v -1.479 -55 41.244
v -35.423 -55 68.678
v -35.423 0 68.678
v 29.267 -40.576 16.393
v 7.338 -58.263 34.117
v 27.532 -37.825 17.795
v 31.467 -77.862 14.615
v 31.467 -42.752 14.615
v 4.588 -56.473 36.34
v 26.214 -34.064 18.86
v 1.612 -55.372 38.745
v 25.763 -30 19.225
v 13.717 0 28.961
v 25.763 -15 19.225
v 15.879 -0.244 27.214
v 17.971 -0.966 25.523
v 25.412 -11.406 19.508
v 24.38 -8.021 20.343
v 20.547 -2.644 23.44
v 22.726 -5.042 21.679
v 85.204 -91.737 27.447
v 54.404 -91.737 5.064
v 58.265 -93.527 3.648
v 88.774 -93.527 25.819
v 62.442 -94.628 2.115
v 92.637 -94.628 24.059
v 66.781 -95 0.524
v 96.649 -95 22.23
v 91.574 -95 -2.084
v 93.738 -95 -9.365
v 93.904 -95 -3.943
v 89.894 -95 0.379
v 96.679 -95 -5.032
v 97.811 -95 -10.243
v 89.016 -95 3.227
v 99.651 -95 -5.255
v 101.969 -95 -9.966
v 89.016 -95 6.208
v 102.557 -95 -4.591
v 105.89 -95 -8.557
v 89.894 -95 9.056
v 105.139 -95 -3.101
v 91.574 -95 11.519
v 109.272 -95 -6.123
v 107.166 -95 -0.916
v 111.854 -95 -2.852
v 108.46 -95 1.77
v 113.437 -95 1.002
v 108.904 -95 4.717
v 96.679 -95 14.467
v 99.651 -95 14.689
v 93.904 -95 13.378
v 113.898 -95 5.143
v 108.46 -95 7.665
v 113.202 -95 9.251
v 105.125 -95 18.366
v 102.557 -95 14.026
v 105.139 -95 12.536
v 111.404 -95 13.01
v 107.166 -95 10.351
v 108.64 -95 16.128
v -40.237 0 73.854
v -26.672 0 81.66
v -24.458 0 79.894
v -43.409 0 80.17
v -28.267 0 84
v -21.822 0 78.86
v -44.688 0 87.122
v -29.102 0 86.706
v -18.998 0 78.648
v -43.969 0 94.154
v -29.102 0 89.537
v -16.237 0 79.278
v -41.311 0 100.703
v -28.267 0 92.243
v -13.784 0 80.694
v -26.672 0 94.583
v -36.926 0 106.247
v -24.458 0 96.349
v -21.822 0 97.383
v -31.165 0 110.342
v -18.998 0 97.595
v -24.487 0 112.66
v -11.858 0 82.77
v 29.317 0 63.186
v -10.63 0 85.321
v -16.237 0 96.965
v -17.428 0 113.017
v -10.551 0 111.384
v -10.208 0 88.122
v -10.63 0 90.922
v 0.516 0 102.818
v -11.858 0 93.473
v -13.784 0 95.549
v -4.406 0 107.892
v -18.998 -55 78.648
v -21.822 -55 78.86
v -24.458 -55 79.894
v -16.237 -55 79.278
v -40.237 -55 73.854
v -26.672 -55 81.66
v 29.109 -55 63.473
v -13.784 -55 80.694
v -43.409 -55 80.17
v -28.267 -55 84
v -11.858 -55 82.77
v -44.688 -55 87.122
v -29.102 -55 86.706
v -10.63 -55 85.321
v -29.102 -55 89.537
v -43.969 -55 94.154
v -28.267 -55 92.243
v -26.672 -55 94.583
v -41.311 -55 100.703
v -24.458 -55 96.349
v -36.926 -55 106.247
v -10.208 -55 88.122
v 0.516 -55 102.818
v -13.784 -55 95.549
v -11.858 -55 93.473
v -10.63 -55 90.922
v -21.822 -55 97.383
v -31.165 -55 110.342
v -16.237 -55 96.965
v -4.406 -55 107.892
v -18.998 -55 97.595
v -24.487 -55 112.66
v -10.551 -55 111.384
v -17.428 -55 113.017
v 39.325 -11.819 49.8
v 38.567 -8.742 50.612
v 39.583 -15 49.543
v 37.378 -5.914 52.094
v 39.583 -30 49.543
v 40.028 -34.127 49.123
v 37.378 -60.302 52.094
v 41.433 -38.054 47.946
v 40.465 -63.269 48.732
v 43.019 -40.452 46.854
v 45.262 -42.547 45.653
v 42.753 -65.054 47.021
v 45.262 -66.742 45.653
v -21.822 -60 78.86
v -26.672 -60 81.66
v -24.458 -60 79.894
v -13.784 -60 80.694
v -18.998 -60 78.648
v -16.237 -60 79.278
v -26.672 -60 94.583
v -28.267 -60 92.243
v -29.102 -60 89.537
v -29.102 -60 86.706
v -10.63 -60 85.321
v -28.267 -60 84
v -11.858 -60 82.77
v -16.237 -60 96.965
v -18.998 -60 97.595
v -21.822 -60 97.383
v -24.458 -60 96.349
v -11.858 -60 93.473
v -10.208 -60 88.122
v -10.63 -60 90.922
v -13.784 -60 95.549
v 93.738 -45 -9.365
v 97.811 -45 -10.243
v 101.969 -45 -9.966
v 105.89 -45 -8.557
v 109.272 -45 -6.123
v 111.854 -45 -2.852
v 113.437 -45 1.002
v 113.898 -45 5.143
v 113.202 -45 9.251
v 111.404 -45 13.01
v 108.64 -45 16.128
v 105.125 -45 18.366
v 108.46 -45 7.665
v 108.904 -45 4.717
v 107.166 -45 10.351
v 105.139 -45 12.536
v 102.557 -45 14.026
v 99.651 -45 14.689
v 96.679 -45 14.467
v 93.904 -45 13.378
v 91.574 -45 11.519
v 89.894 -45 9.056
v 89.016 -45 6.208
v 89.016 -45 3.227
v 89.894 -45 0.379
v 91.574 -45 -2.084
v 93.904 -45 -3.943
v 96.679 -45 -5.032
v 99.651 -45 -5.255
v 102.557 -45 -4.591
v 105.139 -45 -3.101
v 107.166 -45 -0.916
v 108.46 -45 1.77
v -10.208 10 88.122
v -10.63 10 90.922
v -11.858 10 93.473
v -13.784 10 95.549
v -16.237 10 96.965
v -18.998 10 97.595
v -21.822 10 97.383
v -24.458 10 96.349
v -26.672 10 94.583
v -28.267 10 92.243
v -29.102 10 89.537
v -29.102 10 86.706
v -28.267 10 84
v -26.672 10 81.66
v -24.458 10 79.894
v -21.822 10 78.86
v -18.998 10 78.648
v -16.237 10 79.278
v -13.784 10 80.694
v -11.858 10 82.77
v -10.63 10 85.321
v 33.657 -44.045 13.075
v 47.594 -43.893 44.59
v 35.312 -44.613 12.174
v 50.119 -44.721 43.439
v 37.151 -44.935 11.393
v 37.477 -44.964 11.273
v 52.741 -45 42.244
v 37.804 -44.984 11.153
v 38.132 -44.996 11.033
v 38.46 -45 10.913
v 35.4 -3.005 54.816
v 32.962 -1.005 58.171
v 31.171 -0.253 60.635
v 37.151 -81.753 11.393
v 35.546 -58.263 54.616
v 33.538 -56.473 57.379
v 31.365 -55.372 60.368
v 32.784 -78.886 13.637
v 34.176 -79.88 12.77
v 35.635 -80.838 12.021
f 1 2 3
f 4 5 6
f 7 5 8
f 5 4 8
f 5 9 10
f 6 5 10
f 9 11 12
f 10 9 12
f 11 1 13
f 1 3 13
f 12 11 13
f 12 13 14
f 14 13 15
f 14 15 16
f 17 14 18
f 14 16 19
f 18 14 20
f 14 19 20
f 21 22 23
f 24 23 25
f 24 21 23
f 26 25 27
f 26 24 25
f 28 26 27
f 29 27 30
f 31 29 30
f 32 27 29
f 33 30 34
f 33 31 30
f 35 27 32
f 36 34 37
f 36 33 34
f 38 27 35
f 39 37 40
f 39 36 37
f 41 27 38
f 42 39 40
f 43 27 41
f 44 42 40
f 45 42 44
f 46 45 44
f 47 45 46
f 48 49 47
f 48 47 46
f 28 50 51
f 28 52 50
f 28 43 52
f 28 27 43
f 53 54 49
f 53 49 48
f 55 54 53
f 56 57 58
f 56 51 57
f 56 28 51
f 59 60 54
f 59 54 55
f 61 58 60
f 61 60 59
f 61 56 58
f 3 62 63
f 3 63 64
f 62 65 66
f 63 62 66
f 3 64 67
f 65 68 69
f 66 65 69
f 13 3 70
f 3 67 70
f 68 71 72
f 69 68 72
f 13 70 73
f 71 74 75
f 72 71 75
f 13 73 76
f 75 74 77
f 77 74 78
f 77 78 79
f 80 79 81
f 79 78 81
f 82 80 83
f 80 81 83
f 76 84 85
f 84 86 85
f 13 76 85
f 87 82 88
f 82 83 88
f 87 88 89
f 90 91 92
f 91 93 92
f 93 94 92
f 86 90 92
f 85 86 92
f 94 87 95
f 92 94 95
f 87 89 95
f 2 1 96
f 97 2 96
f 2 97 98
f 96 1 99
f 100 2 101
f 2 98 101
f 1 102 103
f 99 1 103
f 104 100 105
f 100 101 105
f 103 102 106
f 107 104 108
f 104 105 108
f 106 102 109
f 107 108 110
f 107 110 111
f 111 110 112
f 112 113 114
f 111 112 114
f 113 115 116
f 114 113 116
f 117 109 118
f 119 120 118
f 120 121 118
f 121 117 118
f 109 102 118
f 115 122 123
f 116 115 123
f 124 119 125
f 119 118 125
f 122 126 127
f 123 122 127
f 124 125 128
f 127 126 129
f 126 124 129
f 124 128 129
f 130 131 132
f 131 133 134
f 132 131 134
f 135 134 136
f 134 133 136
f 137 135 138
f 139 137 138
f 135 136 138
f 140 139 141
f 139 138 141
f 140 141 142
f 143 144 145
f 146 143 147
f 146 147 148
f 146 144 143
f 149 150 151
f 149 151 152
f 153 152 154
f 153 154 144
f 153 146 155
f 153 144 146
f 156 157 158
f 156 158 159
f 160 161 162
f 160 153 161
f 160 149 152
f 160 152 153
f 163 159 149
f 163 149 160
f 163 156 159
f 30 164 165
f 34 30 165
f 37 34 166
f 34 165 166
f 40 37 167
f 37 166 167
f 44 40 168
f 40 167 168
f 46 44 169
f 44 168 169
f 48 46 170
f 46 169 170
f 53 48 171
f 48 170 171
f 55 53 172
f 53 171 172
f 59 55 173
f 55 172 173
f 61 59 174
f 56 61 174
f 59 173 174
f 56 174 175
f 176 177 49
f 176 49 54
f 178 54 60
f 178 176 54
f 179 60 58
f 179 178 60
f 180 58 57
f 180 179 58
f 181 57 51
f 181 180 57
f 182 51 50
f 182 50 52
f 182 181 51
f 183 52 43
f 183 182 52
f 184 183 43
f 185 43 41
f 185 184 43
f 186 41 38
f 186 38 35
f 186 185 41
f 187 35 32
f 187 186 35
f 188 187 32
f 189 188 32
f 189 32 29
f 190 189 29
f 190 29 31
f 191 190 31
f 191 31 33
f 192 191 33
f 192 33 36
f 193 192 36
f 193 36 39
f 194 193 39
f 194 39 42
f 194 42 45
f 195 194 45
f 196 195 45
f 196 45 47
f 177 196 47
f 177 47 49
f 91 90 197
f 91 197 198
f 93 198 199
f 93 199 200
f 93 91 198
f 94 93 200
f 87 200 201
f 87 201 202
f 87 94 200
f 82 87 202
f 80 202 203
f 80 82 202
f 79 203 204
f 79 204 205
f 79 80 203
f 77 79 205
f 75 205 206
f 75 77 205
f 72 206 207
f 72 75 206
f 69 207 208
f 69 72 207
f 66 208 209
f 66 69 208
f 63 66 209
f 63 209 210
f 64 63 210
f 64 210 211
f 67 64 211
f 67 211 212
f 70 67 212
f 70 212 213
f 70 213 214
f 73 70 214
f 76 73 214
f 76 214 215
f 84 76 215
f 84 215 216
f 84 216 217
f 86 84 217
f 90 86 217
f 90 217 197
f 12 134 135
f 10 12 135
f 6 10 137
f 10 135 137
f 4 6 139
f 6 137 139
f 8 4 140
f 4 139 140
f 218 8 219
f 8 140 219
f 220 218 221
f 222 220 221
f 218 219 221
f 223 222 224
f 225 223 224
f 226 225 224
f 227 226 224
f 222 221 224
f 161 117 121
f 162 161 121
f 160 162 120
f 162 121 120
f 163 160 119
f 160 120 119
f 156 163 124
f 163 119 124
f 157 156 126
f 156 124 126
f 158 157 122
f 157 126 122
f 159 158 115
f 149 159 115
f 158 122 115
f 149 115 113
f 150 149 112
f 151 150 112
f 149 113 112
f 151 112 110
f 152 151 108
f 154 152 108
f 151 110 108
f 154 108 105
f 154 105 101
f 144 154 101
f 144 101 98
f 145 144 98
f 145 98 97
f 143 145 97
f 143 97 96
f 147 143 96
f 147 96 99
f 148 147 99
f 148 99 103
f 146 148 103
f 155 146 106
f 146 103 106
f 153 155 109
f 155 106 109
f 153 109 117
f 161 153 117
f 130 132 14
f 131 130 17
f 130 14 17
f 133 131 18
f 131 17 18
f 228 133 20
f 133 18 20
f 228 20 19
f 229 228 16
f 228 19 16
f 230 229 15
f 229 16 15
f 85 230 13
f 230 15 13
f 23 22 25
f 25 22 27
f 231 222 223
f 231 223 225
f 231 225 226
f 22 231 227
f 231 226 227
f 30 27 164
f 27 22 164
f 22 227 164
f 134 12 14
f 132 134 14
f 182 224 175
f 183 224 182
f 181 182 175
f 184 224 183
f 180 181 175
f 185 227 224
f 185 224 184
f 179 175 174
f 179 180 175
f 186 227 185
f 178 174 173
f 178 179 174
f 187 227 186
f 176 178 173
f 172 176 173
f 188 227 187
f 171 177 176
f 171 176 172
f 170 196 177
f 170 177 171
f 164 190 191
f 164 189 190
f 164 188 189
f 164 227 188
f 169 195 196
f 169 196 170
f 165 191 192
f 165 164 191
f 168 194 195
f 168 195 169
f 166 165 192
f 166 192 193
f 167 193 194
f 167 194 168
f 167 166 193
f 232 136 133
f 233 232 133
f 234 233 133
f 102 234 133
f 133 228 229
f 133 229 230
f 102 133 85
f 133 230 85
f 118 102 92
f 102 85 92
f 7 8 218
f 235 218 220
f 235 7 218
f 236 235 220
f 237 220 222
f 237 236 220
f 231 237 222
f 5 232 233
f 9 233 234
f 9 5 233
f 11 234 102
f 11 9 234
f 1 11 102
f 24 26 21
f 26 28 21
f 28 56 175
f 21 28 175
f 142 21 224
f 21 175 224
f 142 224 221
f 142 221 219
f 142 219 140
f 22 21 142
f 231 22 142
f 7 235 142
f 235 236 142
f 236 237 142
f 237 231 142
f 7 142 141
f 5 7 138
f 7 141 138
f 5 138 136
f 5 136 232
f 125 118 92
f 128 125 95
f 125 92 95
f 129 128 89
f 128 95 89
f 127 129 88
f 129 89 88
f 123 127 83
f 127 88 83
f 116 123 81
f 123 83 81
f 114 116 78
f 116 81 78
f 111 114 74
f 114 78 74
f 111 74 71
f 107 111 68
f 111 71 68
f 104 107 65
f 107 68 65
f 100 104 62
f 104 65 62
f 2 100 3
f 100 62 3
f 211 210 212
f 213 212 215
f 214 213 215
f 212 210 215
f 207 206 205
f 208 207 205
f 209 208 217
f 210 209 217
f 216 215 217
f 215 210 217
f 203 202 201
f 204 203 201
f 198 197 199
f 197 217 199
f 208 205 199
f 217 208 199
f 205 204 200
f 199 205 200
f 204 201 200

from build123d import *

# Parameters (mm, degrees)
F0_R          = 10
F0_R_2        = 9.5
F1_DEPTH      = 95
F3_DEPTH      = 103.0741500701
F3_DEPTH_BACK = 97.783322066
F4_W          = 111.3981074931
F4_H          = 45
F5_DEPTH      = 88.2146892838
F5_DEPTH_BACK = 25
F6_R          = 15
F7_R          = 20
F8_R          = 9.5
F9_DEPTH      = 5
F9_DEPTH_BACK = 65
F10_R         = 20


with BuildPart() as f1:
    # F0 (on Front) → F1 (new body)
    with BuildSketch(Plane.XZ):
        with BuildLine():
            Line((40.472202318, 47.836435473), (0.5161550447, 102.8184539019))
            ThreePointArc((0.5161550447, 102.8184539019), (-36.9259098509, 106.247026954), (-35.422653502, 68.6783756984))
            Line((-35.422653502, 68.6783756984), (34.0419716339, 12.5334943419))
            Line((34.0419716339, 12.5334943419), (93.7381570012, -9.3650366096))
            ThreePointArc((93.7381570012, -9.3650366096), (112.7797489078, -0.9804332321), (105.1254790408, 18.3662964382))
            Line((105.1254790408, 18.3662964382), (40.472202318, 47.836435473))
        make_face()
        with Locations((98.9040414947, 4.7173508797)):
            Circle(F0_R, mode=Mode.SUBTRACT)
        with Locations((-19.7076478051, 88.121590349)):
            Circle(F0_R_2, mode=Mode.SUBTRACT)
    extrude(amount=F1_DEPTH)

    # F2 (on face) → F3 (cut, two sides)
    with BuildSketch(Plane(origin=(49.2343596113, 0, 35.7791593745), x_dir=(0, 1, 0), z_dir=(0.808952114, 0, 0.5878745421))) as f3_sk:
        Polygon((-55, 28.273306787), (-55, 107.9234746602), (-95, 107.9234746602), (-95, -12.0765253398), (-95, -32.8742563725), align=None)
    extrude(amount=-F3_DEPTH, mode=Mode.SUBTRACT)
    extrude(f3_sk.sketch, amount=F3_DEPTH_BACK, mode=Mode.SUBTRACT)

    # F4 (on face) → F5 (cut, two sides)
    with BuildSketch(Plane(origin=(25.0160459603, 0, 54.8816325595), x_dir=(0.9099297039, 0, -0.4147625031), z_dir=(0.4147625031, 0, 0.9099297039))) as f5_sk:
        with Locations((71.1682909773, -22.5)):
            Rectangle(F4_W, F4_H)
    extrude(amount=-F5_DEPTH, mode=Mode.SUBTRACT)
    extrude(f5_sk.sketch, amount=F5_DEPTH_BACK, mode=Mode.SUBTRACT)

    # F6
    f6_edges = [f1.edges().sort_by_distance(p)[0] for p in [
        (32.605588, -45, 34.23539),
        (32.605588, 0, 34.23539),
    ]]
    fillet(f6_edges, radius=F6_R)

    # F7
    f7_edges = [f1.edges().sort_by_distance(p)[0] for p in [
        (40.472202, -50.159062, 47.836435),
        (34.041972, -62.100604, 12.533494),
    ]]
    fillet(f7_edges, radius=F7_R)

    # F8 (on face) → F9 (join, two sides)
    with BuildSketch(Plane.XZ.offset(55)) as f9_sk:
        with Locations((-19.7076478051, 88.121590349)):
            Circle(F8_R)
    extrude(amount=F9_DEPTH)
    extrude(f9_sk.sketch, amount=-F9_DEPTH_BACK)

    # F10
    f10_edges = [f1.edges().sort_by_distance(p)[0] for p in [
        (17.967044, -55, 48.007383),
        (75.23055, -95, 14.032807),
    ]]
    fillet(f10_edges, radius=F10_R)


solid = f1.part
